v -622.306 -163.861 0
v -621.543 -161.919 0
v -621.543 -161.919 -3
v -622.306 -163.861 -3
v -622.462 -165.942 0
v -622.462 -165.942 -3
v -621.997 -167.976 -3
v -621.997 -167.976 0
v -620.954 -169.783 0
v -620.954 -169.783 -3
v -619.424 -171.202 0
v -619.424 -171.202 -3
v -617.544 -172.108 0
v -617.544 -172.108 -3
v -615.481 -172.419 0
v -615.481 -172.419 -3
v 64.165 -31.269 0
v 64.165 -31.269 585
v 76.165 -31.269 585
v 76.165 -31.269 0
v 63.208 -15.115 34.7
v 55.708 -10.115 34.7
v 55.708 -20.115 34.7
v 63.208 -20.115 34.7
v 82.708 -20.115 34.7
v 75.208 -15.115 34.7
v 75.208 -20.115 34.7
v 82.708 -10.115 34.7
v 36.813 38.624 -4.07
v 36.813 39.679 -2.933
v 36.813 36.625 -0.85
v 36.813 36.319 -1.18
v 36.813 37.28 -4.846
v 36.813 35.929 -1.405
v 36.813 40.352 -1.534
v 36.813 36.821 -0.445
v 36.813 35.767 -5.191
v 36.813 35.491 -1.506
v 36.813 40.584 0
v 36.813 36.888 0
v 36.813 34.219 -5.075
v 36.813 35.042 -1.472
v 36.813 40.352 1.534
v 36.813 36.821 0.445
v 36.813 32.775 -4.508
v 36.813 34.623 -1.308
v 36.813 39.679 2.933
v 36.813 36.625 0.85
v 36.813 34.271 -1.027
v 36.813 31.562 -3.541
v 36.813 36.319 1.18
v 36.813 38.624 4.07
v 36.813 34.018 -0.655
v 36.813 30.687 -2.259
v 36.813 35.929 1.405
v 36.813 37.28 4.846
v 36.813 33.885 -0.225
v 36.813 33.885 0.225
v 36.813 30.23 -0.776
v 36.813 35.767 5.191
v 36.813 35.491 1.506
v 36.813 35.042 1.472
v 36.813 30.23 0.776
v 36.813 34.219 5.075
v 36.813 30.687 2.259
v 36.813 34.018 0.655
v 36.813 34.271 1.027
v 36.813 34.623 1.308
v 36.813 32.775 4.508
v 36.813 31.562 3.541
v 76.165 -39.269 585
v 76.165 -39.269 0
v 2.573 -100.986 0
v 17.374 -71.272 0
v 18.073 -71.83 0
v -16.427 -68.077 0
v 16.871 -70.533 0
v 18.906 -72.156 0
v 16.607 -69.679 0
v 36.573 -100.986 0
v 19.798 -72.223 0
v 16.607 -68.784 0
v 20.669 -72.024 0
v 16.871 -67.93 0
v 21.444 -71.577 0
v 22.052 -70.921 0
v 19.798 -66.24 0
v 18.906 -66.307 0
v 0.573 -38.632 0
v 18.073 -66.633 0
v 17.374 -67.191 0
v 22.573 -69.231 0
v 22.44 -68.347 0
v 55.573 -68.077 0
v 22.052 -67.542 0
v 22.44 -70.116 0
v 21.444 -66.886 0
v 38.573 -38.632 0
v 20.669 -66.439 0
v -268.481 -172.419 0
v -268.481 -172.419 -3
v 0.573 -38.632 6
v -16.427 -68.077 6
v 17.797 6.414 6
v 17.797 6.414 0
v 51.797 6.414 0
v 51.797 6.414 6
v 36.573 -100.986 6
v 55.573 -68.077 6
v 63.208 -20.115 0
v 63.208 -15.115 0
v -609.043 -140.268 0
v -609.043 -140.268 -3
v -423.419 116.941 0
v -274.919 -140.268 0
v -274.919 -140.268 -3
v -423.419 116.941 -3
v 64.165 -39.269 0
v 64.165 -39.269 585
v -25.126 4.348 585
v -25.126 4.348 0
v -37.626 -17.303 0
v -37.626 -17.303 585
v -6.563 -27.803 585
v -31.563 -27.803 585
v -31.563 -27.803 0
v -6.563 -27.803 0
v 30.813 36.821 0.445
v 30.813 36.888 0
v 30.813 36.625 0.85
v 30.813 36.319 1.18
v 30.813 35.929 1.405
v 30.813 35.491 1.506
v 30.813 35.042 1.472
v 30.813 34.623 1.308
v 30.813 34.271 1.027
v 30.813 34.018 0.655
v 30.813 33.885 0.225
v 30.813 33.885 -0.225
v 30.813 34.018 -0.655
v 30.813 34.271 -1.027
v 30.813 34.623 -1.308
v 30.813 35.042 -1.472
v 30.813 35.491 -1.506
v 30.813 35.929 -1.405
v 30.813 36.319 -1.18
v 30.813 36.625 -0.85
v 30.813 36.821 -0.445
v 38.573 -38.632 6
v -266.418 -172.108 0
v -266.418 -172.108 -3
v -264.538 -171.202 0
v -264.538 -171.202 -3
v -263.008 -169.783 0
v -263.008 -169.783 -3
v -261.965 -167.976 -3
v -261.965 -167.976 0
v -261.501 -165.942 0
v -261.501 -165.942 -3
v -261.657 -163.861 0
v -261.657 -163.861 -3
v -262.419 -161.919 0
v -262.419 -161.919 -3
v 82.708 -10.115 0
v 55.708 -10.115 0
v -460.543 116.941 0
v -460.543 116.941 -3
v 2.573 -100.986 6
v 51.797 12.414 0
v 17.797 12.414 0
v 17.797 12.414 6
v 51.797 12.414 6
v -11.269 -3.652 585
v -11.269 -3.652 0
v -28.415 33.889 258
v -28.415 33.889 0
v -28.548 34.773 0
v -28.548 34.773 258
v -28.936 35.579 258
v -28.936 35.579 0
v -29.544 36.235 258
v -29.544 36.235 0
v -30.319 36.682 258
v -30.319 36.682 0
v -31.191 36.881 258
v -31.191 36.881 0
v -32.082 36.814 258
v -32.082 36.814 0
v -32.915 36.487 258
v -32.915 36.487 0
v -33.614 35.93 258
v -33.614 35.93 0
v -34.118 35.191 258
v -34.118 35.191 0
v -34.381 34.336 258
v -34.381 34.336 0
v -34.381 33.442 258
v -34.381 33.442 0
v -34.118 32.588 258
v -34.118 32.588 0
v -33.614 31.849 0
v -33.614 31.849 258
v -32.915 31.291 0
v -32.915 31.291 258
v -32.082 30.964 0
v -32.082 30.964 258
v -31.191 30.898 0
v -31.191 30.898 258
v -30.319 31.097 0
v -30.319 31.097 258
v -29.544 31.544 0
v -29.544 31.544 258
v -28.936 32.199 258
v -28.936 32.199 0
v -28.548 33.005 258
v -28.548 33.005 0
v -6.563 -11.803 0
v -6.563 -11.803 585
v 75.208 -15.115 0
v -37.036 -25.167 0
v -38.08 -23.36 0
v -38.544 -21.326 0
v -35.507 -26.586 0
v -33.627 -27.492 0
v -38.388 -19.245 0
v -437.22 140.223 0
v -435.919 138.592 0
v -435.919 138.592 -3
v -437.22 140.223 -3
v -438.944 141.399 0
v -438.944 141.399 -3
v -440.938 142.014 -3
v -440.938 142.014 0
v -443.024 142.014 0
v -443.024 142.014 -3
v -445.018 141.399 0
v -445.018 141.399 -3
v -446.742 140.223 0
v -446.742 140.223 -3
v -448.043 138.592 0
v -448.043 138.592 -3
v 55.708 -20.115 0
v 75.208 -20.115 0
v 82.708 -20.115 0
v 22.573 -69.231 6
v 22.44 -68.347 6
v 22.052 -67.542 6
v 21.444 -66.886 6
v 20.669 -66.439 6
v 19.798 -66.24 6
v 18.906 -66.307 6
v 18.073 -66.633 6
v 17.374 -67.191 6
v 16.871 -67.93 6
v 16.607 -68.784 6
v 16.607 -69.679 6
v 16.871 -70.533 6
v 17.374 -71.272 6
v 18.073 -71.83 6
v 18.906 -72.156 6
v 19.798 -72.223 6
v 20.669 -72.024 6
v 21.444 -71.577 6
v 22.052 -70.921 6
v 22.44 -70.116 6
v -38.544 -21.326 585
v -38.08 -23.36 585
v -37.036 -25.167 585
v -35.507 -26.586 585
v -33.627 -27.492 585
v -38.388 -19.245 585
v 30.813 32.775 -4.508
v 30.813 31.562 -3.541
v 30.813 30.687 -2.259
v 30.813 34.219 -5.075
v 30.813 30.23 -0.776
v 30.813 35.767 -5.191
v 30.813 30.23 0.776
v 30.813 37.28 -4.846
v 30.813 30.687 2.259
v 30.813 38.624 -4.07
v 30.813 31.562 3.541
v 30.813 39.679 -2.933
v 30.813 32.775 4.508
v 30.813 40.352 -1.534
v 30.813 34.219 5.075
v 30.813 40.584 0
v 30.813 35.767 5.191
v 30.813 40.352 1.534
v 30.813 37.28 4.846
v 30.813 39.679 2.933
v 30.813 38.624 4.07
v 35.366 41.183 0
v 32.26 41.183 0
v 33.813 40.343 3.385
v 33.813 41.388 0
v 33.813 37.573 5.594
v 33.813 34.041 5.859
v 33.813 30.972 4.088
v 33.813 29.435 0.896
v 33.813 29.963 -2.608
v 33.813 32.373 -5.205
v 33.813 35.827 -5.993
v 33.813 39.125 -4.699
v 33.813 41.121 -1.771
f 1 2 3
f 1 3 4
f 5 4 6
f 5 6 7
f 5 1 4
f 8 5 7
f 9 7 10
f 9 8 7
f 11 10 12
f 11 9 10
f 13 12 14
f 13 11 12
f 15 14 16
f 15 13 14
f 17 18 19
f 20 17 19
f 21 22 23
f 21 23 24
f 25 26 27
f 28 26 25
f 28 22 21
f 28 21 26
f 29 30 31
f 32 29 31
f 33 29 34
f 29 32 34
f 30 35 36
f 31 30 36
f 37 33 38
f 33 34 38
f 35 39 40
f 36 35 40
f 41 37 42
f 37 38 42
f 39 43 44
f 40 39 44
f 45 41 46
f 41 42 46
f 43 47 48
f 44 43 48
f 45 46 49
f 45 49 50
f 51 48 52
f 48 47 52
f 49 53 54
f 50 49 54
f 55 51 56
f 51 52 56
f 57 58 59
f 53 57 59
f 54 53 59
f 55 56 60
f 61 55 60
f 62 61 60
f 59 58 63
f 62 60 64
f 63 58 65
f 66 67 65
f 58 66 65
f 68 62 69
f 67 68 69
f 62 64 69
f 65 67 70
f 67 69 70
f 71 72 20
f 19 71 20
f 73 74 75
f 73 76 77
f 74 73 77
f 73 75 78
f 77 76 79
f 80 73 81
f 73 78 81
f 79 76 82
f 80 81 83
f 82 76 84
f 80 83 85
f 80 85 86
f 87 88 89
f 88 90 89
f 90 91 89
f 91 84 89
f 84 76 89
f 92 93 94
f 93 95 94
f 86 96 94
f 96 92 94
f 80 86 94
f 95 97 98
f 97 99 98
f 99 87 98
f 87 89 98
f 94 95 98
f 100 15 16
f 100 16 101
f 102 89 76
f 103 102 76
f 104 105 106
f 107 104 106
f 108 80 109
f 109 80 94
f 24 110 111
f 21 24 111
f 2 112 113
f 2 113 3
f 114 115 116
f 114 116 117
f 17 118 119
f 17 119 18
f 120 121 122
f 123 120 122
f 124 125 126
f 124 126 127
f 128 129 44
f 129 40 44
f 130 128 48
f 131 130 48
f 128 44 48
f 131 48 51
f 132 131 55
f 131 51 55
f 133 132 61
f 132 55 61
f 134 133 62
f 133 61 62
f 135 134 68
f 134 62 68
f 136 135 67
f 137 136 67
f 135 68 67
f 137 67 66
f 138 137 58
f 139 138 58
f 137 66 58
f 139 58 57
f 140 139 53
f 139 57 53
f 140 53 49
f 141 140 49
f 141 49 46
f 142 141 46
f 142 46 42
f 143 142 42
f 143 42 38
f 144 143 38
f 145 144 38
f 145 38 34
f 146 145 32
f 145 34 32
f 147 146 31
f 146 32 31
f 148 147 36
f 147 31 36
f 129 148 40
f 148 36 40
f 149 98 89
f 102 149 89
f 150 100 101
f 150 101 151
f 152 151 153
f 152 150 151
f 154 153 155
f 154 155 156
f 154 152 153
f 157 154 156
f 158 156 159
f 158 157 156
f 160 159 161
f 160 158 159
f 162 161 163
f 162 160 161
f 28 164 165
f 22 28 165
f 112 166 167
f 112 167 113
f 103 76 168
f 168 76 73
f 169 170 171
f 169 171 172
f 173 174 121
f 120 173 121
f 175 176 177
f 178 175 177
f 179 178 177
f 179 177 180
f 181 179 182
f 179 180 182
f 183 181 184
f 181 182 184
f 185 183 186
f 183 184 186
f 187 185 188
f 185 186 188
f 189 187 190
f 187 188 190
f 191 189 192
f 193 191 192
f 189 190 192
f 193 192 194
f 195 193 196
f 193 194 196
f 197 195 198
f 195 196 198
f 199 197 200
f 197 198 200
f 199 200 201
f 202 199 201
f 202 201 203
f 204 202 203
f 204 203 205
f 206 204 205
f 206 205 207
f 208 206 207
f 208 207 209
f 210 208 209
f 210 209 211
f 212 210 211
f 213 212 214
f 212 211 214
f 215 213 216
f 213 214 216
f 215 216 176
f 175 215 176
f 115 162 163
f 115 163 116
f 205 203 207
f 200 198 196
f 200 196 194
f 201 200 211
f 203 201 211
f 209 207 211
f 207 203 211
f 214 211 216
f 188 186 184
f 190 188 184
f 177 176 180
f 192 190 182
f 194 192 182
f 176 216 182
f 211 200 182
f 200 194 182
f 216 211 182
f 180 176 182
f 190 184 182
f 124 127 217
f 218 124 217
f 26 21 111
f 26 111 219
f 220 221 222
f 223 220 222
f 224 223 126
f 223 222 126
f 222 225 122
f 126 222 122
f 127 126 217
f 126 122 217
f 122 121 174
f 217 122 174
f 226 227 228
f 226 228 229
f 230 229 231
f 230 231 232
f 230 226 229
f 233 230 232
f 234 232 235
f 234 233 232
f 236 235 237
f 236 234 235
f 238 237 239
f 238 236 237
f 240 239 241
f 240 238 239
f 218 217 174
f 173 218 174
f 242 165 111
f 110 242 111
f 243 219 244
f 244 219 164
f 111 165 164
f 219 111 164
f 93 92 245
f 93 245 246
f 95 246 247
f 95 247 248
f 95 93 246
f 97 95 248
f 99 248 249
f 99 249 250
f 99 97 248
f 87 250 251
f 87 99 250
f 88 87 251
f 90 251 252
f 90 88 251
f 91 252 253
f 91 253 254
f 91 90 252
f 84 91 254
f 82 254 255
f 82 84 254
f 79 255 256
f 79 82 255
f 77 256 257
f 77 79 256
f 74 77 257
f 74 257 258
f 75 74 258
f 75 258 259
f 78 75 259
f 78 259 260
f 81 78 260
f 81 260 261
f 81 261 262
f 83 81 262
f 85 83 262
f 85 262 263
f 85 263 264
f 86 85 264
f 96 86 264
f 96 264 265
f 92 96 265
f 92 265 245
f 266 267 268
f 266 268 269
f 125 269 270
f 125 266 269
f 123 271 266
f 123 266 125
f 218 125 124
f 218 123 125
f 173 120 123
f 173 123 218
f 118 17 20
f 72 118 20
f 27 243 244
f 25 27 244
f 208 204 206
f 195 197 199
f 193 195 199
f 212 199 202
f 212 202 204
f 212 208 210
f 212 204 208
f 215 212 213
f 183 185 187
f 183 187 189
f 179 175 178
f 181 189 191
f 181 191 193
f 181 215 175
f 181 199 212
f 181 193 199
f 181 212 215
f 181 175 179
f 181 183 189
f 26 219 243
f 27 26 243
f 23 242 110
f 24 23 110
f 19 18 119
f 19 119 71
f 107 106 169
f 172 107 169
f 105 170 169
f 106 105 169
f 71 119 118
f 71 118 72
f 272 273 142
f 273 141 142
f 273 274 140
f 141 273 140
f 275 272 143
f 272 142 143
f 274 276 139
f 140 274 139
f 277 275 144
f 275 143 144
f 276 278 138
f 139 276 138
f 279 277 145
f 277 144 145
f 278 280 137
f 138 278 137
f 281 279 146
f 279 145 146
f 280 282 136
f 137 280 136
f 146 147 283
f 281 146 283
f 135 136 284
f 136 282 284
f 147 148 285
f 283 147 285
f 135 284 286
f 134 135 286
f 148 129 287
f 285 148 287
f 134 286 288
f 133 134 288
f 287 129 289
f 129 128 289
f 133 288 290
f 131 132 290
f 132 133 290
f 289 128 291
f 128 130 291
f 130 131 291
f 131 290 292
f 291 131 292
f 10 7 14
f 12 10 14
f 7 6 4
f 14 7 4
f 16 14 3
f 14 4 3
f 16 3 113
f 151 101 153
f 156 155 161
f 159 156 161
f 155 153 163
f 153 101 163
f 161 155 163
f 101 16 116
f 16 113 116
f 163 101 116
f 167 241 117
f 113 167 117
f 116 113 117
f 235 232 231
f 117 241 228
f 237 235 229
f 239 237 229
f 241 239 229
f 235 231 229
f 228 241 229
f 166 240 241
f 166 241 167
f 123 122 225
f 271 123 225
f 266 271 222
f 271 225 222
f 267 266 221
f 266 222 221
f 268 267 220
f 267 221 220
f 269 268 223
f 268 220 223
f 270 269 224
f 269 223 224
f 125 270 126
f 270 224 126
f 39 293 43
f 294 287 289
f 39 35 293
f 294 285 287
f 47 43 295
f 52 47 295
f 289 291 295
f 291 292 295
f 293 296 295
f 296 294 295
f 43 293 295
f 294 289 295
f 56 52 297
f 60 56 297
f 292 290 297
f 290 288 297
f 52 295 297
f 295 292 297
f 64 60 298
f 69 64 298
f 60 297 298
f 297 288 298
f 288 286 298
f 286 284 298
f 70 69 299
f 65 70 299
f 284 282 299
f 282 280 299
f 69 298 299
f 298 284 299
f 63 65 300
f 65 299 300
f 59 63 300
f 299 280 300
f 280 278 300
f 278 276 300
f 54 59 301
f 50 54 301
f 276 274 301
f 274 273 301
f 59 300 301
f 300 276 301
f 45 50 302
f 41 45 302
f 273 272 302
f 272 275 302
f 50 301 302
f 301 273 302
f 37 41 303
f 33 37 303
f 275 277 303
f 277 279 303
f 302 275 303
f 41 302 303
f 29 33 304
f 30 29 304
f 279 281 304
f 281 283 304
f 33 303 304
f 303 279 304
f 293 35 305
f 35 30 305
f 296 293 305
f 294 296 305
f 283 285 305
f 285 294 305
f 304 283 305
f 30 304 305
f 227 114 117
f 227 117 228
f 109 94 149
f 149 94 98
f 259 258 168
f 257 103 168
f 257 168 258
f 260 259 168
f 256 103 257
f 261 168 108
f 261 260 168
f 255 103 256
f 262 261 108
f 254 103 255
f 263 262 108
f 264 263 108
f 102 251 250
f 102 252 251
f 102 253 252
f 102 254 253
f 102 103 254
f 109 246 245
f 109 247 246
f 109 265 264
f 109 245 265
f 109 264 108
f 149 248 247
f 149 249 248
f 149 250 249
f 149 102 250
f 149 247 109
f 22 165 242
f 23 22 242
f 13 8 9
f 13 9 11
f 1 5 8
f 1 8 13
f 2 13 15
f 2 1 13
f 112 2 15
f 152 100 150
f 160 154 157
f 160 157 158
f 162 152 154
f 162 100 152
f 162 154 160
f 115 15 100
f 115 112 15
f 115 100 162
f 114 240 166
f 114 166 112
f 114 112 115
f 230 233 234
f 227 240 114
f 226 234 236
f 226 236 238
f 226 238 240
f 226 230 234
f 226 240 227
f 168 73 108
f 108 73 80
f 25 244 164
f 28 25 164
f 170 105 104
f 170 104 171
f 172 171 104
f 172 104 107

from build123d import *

# Parameters (mm, degrees)
F1_DEPTH  = 585
F2_W      = 12
F2_H      = 8
F3_DEPTH  = 585
F5_DEPTH  = 34.7
F8_R      = 3
F9_DEPTH  = 258
F10_W     = 34
F10_H     = 6
F11_DEPTH = 6
F12_R     = 3
F13_DEPTH = 6
F15_DEPTH = 3
F16_DEPTH = 1


with BuildPart() as f1:
    # F0 (on Top) → F1 (new body)
    with BuildSketch(Plane.XY):
        with BuildLine():
            ThreePointArc((-37.625637, -17.302601), (-37.625637, -24.302601), (-31.563459, -27.802601))
            Line((-31.563459, -27.802601), (-6.563459, -27.802601))
            Line((-6.563459, -27.802601), (-6.563459, -11.802601))
            Line((-6.563459, -11.802601), (-11.26923, -3.651966))
            Line((-11.26923, -3.651966), (-25.125637, 4.348034))
            Line((-25.125637, 4.348034), (-37.625637, -17.302601))
        make_face()
    extrude(amount=F1_DEPTH)


with BuildPart() as f3:
    # F2 (on Top) → F3 (new body)
    with BuildSketch(Plane.XY):
        with Locations((70.165452, -35.26907)):
            Rectangle(F2_W, F2_H)
    extrude(amount=F3_DEPTH)


with BuildPart() as f5:
    # F4 (on Top) → F5 (new body)
    with BuildSketch(Plane.XY):
        Polygon((82.708252, -10.115262), (55.708252, -10.115262), (55.708252, -20.115262), (63.208252, -20.115262), (63.208252, -15.115262), (75.208252, -15.115262), (75.208252, -20.115262), (82.708252, -20.115262), align=None)
    extrude(amount=F5_DEPTH)


with BuildPart() as f7:
    # F6 (on Top) → F7 (revolve)
    with BuildSketch(Plane.XY):
        with BuildLine():
            Line((36.813329, 36.887594), (36.813329, 40.583747))
            ThreePointArc((36.813329, 40.583747), (33.813329, 41.387594), (30.813329, 40.583747))
            Line((30.813329, 40.583747), (30.813329, 36.887594))
            Line((30.813329, 36.887594), (36.813329, 36.887594))
        make_face()
    revolve(axis=Axis((35.034446, 35.377819, 0), (1, 0, 0)))


with BuildPart() as f9:
    # F8 (on Top) → F9 (new body)
    with BuildSketch(Plane.XY):
        with Locations((-31.414777, 33.889171)):
            Circle(F8_R)
    extrude(amount=F9_DEPTH)


with BuildPart() as f11:
    # F10 (on Top) → F11 (new body)
    with BuildSketch(Plane.XY):
        with Locations((34.797049, 9.413773)):
            Rectangle(F10_W, F10_H)
    extrude(amount=F11_DEPTH)


with BuildPart() as f13:
    # F12 (on Top) → F13 (new body)
    with BuildSketch(Plane.XY):
        Polygon((-16.42655, -68.076786), (2.57345, -100.985751), (36.57345, -100.985751), (55.57345, -68.076786), (38.57345, -38.631922), (0.57345, -38.631922), align=None)
        with Locations((19.57345, -69.231486)):
            Circle(F12_R, mode=Mode.SUBTRACT)
    extrude(amount=F13_DEPTH)

    # F12 (on Top) → F16 (join)
    with BuildSketch(Plane.XY):
        Polygon((-16.42655, -68.076786), (2.57345, -100.985751), (36.57345, -100.985751), (55.57345, -68.076786), (38.57345, -38.631922), (0.57345, -38.631922), align=None)
        with Locations((19.57345, -69.231486)):
            Circle(F12_R, mode=Mode.SUBTRACT)
    extrude(amount=F16_DEPTH)


with BuildPart() as f15:
    # F14 (on Top) → F15 (new body)
    with BuildSketch(Plane.XY):
        with BuildLine():
            ThreePointArc((-435.918998, 138.59213), (-441.981176, 142.09213), (-448.043354, 138.59213))
            Line((-448.043354, 138.59213), (-460.543354, 116.941495))
            Line((-460.543354, 116.941495), (-446.686948, 108.941495))
            Line((-446.686948, 108.941495), (-437.275405, 108.941495))
            Line((-437.275405, 108.941495), (-423.418998, 116.941495))
            Line((-423.418998, 116.941495), (-435.918998, 138.59213))
        make_face()
        Polygon((-446.686948, 108.941495), (-460.543354, 116.941495), (-609.043354, -140.26805), (-595.186948, -148.26805), (-590.481176, -156.418685), (-590.481176, -172.418685), (-293.481176, -172.418685), (-293.481176, -156.418685), (-288.775405, -148.26805), (-274.918998, -140.26805), (-423.418998, 116.941495), (-437.275405, 108.941495), align=None)
        with BuildLine():
            Line((-595.186948, -148.26805), (-609.043354, -140.26805))
            Line((-609.043354, -140.26805), (-621.543354, -161.918685))
            ThreePointArc((-621.543354, -161.918685), (-621.543354, -168.918685), (-615.481176, -172.418685))
            Line((-615.481176, -172.418685), (-590.481176, -172.418685))
            Line((-590.481176, -172.418685), (-590.481176, -156.418685))
            Line((-590.481176, -156.418685), (-595.186948, -148.26805))
        make_face()
        with BuildLine():
            Line((-262.418998, -161.918685), (-274.918998, -140.26805))
            Line((-274.918998, -140.26805), (-288.775405, -148.26805))
            Line((-288.775405, -148.26805), (-293.481176, -156.418685))
            Line((-293.481176, -156.418685), (-293.481176, -172.418685))
            Line((-293.481176, -172.418685), (-268.481176, -172.418685))
            ThreePointArc((-268.481176, -172.418685), (-262.418998, -168.918685), (-262.418998, -161.918685))
        make_face()
    extrude(amount=-F15_DEPTH)


solid = Compound([f1.part, f3.part, f5.part, f7.part, f9.part, f11.part, f13.part, f15.part])
